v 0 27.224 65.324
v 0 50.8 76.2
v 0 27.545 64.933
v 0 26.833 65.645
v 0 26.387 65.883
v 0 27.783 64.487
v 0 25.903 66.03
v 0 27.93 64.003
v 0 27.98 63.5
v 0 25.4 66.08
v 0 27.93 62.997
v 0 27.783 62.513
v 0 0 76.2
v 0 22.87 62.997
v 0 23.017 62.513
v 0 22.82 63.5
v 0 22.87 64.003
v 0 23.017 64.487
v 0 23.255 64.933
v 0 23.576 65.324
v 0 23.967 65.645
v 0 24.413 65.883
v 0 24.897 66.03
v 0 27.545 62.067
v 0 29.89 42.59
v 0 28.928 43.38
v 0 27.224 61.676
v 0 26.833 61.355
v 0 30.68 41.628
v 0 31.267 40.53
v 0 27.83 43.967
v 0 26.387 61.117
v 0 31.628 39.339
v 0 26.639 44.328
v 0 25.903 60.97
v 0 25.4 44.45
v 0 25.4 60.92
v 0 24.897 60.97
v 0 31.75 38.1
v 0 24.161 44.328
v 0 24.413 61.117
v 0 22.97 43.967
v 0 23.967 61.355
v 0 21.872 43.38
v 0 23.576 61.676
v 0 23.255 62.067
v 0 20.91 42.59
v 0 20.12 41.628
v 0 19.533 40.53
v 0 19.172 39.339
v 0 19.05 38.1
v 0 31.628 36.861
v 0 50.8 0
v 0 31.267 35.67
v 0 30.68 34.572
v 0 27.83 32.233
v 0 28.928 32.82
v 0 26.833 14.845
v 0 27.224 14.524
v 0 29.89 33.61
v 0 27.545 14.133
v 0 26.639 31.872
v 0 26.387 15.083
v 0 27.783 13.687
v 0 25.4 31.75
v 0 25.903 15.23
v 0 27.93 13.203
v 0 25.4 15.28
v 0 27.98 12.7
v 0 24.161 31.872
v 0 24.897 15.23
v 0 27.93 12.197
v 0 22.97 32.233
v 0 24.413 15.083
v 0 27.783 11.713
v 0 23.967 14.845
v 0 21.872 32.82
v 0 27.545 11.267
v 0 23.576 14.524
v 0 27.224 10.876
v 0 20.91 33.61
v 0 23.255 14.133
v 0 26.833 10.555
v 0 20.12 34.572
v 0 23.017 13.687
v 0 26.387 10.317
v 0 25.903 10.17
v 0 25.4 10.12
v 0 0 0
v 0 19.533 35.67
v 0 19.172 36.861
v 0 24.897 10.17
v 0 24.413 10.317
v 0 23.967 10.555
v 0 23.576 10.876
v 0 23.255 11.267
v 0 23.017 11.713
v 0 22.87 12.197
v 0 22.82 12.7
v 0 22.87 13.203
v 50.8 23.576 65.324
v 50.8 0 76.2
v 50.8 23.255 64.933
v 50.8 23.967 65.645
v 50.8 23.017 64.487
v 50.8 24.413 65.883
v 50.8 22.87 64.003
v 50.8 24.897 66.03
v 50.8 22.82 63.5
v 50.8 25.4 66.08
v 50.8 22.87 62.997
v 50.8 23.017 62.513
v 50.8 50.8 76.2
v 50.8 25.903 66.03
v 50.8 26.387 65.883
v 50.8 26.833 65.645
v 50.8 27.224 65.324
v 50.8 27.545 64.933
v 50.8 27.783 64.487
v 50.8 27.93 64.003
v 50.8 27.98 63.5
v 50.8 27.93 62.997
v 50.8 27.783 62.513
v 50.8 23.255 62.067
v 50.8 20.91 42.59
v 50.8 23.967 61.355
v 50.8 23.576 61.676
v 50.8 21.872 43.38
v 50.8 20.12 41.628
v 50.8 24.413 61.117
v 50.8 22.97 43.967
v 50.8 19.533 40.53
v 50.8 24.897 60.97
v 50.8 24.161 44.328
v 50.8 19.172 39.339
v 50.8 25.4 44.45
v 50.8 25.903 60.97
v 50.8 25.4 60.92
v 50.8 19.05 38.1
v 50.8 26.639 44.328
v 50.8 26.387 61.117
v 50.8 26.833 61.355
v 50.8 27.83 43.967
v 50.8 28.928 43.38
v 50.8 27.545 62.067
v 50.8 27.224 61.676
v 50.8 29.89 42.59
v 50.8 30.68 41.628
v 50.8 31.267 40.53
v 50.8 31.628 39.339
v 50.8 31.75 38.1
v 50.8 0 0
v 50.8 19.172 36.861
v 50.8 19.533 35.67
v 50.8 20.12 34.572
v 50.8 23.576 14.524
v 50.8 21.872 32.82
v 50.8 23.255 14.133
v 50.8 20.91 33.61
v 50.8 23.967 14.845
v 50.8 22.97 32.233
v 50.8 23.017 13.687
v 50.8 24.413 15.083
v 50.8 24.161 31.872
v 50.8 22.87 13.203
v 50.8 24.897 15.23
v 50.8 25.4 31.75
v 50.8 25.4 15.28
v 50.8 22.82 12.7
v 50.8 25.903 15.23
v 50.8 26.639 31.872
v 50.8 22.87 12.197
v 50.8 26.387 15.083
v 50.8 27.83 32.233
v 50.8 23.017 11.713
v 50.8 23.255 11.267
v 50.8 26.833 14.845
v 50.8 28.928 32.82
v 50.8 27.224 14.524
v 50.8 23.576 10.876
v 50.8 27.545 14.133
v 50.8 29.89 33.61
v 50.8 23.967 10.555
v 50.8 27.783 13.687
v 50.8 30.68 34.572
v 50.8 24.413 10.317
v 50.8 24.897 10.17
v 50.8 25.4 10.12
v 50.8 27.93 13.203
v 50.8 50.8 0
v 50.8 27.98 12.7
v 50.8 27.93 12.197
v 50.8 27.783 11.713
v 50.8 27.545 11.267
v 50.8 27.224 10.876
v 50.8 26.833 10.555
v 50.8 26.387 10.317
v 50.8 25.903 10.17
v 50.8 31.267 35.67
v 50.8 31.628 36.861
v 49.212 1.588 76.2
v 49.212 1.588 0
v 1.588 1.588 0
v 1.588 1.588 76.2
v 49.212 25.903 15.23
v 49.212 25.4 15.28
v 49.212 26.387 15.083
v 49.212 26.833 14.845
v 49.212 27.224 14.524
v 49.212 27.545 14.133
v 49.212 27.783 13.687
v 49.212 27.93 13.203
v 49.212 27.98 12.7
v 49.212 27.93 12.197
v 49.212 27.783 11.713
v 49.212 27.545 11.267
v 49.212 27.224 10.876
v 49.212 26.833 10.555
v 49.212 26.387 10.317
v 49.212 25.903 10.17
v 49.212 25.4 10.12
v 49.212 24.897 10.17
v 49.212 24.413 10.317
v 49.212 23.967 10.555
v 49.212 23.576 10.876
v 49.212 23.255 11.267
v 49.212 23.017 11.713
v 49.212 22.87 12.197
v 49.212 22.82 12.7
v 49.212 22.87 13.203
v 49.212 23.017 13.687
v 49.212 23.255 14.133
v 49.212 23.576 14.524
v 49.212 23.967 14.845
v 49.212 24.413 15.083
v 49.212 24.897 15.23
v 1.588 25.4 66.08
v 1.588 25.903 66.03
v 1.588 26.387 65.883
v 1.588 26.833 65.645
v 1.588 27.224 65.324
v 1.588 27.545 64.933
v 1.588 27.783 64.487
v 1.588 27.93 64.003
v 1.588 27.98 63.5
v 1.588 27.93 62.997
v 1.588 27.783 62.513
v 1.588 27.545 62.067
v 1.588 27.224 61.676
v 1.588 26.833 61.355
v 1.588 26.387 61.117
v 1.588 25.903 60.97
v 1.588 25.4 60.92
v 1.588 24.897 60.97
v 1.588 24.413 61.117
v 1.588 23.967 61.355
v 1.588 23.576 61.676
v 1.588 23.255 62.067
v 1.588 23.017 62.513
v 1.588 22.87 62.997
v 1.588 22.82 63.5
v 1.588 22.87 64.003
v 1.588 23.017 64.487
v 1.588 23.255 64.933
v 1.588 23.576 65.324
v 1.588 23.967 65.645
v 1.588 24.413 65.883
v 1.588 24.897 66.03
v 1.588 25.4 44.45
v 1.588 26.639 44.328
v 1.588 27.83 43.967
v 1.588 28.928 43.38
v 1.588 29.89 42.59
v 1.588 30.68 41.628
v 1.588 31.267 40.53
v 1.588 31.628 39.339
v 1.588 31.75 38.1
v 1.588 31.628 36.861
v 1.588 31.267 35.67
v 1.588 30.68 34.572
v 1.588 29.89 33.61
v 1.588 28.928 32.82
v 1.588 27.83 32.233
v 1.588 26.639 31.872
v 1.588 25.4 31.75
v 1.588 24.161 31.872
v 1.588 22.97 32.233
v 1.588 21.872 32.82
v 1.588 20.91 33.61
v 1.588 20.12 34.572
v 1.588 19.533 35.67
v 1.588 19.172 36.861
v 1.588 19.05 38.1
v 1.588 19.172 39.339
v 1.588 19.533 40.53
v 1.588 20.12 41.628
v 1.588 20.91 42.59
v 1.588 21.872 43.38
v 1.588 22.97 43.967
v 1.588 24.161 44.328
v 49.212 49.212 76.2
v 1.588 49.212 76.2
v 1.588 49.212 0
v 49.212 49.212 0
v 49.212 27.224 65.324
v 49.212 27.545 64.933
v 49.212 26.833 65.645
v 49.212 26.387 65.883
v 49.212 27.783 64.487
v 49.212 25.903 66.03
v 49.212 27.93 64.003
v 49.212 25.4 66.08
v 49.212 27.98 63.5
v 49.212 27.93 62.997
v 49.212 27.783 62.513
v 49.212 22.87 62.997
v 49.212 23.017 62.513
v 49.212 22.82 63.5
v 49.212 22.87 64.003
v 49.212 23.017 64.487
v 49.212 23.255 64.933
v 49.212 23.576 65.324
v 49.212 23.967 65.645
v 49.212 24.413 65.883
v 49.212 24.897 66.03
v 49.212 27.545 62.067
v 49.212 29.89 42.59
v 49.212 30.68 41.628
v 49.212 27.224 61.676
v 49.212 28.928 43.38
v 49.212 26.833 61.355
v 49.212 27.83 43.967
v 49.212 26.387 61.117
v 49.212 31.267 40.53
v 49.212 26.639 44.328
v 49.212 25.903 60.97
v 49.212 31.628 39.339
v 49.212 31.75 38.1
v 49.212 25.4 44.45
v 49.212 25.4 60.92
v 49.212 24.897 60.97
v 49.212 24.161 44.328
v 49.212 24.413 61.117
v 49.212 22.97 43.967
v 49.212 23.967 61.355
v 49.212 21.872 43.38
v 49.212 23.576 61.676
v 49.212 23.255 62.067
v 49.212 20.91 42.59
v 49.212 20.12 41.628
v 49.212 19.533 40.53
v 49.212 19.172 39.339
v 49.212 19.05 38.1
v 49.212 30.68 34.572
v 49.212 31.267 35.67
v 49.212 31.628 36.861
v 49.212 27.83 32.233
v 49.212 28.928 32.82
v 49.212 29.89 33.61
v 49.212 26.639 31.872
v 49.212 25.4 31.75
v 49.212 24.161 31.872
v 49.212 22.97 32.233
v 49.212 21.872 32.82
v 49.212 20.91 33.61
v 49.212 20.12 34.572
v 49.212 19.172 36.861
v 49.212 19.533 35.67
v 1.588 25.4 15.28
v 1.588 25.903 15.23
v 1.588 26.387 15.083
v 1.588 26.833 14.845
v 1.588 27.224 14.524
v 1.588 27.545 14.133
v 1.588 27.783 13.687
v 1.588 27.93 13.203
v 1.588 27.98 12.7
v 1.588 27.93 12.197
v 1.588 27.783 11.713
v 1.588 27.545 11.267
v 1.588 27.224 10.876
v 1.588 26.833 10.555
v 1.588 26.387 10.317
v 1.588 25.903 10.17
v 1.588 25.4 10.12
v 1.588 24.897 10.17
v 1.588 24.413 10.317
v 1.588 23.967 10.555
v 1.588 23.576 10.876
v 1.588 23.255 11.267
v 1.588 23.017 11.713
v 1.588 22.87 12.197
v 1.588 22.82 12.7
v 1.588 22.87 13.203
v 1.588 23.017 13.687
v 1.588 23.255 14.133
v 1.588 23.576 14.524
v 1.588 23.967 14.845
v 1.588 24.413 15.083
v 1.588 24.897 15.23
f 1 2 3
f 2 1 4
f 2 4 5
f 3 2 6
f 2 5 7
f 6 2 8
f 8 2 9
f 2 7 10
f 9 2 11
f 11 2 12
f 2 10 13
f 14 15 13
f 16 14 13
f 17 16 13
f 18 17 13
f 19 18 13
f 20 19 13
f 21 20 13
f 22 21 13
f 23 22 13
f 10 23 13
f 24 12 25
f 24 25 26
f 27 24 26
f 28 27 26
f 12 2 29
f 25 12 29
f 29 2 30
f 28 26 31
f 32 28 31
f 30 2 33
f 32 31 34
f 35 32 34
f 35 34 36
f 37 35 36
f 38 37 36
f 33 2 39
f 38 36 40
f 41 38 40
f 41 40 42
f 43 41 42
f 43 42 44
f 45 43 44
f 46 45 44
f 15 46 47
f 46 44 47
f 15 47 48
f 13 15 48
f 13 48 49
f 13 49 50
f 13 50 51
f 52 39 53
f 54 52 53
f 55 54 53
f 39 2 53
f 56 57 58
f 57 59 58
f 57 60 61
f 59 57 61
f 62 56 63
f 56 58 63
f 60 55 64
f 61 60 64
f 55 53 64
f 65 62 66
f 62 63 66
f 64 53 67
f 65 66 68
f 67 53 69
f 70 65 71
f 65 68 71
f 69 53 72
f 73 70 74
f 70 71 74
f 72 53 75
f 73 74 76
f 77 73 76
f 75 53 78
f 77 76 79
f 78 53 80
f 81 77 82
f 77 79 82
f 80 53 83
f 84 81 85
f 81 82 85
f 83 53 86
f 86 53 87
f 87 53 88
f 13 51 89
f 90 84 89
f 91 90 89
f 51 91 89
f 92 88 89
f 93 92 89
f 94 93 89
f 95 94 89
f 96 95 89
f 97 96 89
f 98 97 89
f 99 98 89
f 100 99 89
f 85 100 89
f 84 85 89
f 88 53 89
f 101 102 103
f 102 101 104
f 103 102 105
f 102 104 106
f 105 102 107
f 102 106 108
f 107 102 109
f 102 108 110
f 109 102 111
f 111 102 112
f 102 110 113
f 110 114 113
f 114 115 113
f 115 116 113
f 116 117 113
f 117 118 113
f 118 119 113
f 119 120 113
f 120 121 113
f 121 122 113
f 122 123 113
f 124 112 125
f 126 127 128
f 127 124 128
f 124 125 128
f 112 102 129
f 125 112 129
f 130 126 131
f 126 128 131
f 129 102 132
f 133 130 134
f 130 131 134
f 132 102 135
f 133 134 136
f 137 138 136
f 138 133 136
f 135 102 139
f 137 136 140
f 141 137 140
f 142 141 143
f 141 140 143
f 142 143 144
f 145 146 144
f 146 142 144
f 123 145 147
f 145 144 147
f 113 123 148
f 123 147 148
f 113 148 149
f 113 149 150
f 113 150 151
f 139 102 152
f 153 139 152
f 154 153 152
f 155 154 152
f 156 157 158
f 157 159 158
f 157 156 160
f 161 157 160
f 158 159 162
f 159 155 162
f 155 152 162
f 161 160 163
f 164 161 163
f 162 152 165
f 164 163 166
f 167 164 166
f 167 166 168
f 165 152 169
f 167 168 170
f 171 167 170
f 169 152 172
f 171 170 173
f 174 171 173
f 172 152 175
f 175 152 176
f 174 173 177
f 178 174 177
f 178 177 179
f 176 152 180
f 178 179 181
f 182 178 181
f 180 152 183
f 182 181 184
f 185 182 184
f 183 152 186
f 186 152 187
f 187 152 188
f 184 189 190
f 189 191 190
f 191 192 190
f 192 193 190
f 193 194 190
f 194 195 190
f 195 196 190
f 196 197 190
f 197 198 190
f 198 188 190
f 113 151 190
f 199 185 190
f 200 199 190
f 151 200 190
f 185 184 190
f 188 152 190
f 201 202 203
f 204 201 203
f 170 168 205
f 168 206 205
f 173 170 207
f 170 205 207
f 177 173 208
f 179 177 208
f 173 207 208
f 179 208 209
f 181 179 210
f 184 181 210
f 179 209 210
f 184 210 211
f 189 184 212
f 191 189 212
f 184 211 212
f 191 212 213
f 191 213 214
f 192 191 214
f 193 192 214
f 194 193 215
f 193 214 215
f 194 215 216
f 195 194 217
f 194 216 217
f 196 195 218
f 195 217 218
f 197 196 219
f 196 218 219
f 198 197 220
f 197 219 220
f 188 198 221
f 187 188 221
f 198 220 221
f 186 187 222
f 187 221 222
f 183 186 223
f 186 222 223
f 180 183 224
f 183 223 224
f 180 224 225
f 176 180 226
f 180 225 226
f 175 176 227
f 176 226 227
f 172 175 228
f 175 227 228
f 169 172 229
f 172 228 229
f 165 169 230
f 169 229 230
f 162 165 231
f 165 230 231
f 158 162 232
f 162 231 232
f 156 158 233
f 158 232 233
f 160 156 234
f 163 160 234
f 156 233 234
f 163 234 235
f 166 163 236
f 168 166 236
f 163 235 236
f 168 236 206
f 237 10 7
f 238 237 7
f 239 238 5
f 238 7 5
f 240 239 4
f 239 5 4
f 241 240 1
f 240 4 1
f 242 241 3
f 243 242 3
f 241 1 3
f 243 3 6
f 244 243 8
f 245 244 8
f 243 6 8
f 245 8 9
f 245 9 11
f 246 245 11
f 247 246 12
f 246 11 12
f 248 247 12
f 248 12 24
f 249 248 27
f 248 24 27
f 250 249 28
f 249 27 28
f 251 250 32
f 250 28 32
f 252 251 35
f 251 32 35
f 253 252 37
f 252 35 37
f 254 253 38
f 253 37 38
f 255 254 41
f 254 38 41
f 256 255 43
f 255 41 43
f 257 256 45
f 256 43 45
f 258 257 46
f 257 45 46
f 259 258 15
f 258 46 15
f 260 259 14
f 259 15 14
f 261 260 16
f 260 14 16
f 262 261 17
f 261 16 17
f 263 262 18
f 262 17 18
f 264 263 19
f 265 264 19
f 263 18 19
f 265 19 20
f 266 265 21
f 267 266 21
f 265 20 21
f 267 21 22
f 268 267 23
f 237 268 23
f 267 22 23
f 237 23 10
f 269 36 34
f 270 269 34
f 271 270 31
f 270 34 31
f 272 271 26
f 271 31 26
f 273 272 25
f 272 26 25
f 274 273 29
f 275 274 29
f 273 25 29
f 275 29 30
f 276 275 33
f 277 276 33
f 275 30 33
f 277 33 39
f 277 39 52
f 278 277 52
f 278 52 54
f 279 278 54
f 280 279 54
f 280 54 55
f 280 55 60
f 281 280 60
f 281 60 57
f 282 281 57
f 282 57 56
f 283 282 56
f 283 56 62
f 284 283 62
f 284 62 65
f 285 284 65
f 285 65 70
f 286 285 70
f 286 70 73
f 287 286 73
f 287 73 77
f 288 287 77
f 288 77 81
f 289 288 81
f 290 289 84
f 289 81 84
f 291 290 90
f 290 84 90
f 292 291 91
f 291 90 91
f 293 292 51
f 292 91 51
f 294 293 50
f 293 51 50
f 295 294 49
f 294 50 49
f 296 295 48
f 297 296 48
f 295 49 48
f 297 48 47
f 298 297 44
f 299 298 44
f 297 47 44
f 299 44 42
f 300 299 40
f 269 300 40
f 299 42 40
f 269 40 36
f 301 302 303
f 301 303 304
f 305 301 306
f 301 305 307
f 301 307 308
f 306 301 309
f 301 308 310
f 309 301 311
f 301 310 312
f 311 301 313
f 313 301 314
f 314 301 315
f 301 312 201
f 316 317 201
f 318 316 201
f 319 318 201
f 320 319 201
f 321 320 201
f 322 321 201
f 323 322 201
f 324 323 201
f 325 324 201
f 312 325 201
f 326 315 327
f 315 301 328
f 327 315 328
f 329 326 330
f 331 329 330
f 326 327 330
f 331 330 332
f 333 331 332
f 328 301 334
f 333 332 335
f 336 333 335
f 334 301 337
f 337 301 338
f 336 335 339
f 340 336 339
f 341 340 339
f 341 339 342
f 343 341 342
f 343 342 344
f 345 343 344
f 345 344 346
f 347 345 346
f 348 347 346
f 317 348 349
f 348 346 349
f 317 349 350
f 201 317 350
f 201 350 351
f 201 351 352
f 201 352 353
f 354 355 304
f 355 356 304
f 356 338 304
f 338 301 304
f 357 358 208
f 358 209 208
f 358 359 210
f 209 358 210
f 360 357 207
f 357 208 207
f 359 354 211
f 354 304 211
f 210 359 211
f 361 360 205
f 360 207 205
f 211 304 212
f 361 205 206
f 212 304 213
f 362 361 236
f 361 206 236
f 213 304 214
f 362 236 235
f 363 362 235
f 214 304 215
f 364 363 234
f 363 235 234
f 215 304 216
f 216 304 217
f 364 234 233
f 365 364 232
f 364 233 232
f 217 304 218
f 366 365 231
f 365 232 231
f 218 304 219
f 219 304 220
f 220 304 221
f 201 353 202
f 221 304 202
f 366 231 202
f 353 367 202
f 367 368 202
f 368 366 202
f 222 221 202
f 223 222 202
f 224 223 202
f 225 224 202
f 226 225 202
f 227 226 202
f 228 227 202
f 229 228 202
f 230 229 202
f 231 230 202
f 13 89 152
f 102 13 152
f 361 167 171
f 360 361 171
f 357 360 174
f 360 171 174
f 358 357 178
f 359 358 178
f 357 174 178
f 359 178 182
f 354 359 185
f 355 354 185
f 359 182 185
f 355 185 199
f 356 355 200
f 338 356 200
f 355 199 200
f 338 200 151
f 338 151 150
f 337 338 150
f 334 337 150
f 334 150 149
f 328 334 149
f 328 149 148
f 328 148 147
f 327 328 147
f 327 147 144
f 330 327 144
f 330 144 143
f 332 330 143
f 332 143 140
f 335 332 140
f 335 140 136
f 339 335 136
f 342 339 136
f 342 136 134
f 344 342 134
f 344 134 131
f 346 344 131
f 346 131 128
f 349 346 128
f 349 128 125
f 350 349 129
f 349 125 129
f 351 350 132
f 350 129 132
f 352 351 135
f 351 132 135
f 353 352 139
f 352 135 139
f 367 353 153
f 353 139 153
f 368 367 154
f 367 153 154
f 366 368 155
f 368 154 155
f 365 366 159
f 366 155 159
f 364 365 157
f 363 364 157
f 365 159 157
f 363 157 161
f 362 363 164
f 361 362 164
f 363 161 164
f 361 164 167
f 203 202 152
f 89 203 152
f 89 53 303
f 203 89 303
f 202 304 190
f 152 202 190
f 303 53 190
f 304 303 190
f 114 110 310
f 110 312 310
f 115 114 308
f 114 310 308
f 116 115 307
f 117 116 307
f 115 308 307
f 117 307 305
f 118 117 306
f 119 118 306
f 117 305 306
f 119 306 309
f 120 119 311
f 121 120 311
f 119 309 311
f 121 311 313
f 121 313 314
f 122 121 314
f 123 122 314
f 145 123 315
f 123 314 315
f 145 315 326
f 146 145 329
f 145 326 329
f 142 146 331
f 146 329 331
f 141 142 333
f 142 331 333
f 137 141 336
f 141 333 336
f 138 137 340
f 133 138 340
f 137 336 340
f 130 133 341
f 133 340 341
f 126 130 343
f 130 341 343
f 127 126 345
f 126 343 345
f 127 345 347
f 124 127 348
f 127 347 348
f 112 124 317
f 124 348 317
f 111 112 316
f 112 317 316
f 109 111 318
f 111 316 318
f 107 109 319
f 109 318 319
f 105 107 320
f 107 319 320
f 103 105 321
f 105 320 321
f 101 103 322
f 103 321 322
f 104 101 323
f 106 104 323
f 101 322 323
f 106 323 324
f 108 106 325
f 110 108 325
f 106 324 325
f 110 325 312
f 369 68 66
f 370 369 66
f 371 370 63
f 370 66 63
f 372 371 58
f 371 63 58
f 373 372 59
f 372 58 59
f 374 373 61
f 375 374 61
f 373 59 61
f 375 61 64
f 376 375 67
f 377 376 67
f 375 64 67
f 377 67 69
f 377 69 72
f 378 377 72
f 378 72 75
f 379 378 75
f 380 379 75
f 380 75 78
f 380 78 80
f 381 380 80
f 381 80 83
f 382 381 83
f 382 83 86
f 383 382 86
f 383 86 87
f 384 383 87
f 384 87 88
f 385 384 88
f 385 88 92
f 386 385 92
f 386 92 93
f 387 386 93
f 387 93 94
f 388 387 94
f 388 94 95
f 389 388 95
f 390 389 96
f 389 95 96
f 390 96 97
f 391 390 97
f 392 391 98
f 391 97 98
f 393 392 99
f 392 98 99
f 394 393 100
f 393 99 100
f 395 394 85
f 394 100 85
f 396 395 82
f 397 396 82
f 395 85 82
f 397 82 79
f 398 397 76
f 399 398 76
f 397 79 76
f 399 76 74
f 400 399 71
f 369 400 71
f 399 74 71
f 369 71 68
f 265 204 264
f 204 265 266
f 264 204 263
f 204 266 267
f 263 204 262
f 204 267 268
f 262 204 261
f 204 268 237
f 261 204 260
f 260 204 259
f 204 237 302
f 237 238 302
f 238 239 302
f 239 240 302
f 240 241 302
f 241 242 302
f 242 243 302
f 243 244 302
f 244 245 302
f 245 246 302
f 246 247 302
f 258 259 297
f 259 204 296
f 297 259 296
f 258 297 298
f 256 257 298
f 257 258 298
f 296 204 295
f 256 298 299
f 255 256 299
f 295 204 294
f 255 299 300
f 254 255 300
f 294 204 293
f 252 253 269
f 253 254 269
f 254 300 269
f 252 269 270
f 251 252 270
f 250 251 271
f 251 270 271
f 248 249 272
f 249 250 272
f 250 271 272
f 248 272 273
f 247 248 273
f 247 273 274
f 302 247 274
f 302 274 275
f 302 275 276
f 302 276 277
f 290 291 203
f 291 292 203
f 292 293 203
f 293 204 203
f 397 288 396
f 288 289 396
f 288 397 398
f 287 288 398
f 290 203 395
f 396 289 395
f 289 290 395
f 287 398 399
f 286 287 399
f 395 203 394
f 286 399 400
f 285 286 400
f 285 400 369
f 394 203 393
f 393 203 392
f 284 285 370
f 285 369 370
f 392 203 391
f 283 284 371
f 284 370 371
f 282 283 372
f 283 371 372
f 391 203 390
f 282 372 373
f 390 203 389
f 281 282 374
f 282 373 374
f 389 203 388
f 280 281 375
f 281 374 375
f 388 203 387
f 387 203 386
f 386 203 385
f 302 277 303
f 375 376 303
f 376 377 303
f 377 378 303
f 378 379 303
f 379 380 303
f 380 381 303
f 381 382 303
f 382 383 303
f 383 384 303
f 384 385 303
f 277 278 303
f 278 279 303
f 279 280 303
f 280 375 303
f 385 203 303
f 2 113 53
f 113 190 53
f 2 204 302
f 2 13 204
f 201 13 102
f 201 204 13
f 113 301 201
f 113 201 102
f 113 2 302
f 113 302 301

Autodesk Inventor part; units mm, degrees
ref_plane "YZ Plane" through (0, 0, 0) normal (1, 0, 0) x (0, 1, 0)
ref_plane "XZ Plane" through (0, 0, 0) normal (0, 1, 0) x (-1, 0, 0)
ref_plane "XY Plane" through (0, 0, 0) normal (0, 0, 1) x (1, 0, 0)
sketch "Sketch1" plane through (0, 0, 0) normal (0, 0, 1) x (1, 0, 0)
  line L0 (0, 0) -> (50.8, 0)
  line L1 (50.8, 0) -> (50.8, 50.8)
  line L2 (50.8, 50.8) -> (0, 50.8)
  line L3 (0, 50.8) -> (0, 0)
  line L4 (1.5875, 49.2125) -> (49.2125, 49.2125)
  line L5 (49.2125, 49.2125) -> (49.2125, 1.5875)
  line L6 (49.2125, 1.5875) -> (1.5875, 1.5875)
  line L7 (1.5875, 1.5875) -> (1.5875, 49.2125)
  dimension "d0" = 50.8
  dimension "d1" = 50.8
  dimension "d2" = 1.5875
extrude "Extrusion1" add sketch "Sketch1" along normal blind 76.2
sketch "Sketch2" plane through (50.8, 0, 0) normal (1, 0, 0) x (0, 0, -1)
  circle A0 centre (-38.1, 25.4) radius 6.35
  line L0 (0, 0) -> (0, 50.8) projected
  line L1 (0, 50.8) -> (-76.2, 50.8) projected
  dimension "d5" = 12.7
  dimension "d16" = 38.1
  dimension "d17" = 25.4
extrude "Extrusion2" cut sketch "Sketch2" against normal blind 4.7625
sketch "Sketch3" plane through (0, 0, 0) normal (-1, 0, 0) x (0, 0, 1)
  circle A0 centre (38.1, 25.4) radius 6.35 projected
  circle A1 centre (38.1, 25.4) radius 6.35
  point P0 (0, 0)
  dimension "d8" = 12.7
extrude "Extrusion3" cut sketch "Sketch3" against normal blind 4.7625
sketch "Sketch4" plane through (0, 0, 0) normal (-1, 0, 0) x (0, 0, 1)
  line L0 (0, 1.5875) -> (0, 49.2125) construction
  line L1 (0, 25.4) -> (12.7, 25.4) construction
  line L2 (12.7, 25.4) -> (63.5, 25.4) construction
  circle A0 centre (12.7, 25.4) radius 2.5797
  circle A1 centre (63.5, 25.4) radius 2.5797
  point P0 (0, 0)
  dimension "d11" = 12.7
  dimension "d12" = 50.8
  dimension "d13" = 5.1594
extrude "Extrusion4" cut sketch "Sketch4" against normal blind 55.5625
properties part number "new piston mount v2"
